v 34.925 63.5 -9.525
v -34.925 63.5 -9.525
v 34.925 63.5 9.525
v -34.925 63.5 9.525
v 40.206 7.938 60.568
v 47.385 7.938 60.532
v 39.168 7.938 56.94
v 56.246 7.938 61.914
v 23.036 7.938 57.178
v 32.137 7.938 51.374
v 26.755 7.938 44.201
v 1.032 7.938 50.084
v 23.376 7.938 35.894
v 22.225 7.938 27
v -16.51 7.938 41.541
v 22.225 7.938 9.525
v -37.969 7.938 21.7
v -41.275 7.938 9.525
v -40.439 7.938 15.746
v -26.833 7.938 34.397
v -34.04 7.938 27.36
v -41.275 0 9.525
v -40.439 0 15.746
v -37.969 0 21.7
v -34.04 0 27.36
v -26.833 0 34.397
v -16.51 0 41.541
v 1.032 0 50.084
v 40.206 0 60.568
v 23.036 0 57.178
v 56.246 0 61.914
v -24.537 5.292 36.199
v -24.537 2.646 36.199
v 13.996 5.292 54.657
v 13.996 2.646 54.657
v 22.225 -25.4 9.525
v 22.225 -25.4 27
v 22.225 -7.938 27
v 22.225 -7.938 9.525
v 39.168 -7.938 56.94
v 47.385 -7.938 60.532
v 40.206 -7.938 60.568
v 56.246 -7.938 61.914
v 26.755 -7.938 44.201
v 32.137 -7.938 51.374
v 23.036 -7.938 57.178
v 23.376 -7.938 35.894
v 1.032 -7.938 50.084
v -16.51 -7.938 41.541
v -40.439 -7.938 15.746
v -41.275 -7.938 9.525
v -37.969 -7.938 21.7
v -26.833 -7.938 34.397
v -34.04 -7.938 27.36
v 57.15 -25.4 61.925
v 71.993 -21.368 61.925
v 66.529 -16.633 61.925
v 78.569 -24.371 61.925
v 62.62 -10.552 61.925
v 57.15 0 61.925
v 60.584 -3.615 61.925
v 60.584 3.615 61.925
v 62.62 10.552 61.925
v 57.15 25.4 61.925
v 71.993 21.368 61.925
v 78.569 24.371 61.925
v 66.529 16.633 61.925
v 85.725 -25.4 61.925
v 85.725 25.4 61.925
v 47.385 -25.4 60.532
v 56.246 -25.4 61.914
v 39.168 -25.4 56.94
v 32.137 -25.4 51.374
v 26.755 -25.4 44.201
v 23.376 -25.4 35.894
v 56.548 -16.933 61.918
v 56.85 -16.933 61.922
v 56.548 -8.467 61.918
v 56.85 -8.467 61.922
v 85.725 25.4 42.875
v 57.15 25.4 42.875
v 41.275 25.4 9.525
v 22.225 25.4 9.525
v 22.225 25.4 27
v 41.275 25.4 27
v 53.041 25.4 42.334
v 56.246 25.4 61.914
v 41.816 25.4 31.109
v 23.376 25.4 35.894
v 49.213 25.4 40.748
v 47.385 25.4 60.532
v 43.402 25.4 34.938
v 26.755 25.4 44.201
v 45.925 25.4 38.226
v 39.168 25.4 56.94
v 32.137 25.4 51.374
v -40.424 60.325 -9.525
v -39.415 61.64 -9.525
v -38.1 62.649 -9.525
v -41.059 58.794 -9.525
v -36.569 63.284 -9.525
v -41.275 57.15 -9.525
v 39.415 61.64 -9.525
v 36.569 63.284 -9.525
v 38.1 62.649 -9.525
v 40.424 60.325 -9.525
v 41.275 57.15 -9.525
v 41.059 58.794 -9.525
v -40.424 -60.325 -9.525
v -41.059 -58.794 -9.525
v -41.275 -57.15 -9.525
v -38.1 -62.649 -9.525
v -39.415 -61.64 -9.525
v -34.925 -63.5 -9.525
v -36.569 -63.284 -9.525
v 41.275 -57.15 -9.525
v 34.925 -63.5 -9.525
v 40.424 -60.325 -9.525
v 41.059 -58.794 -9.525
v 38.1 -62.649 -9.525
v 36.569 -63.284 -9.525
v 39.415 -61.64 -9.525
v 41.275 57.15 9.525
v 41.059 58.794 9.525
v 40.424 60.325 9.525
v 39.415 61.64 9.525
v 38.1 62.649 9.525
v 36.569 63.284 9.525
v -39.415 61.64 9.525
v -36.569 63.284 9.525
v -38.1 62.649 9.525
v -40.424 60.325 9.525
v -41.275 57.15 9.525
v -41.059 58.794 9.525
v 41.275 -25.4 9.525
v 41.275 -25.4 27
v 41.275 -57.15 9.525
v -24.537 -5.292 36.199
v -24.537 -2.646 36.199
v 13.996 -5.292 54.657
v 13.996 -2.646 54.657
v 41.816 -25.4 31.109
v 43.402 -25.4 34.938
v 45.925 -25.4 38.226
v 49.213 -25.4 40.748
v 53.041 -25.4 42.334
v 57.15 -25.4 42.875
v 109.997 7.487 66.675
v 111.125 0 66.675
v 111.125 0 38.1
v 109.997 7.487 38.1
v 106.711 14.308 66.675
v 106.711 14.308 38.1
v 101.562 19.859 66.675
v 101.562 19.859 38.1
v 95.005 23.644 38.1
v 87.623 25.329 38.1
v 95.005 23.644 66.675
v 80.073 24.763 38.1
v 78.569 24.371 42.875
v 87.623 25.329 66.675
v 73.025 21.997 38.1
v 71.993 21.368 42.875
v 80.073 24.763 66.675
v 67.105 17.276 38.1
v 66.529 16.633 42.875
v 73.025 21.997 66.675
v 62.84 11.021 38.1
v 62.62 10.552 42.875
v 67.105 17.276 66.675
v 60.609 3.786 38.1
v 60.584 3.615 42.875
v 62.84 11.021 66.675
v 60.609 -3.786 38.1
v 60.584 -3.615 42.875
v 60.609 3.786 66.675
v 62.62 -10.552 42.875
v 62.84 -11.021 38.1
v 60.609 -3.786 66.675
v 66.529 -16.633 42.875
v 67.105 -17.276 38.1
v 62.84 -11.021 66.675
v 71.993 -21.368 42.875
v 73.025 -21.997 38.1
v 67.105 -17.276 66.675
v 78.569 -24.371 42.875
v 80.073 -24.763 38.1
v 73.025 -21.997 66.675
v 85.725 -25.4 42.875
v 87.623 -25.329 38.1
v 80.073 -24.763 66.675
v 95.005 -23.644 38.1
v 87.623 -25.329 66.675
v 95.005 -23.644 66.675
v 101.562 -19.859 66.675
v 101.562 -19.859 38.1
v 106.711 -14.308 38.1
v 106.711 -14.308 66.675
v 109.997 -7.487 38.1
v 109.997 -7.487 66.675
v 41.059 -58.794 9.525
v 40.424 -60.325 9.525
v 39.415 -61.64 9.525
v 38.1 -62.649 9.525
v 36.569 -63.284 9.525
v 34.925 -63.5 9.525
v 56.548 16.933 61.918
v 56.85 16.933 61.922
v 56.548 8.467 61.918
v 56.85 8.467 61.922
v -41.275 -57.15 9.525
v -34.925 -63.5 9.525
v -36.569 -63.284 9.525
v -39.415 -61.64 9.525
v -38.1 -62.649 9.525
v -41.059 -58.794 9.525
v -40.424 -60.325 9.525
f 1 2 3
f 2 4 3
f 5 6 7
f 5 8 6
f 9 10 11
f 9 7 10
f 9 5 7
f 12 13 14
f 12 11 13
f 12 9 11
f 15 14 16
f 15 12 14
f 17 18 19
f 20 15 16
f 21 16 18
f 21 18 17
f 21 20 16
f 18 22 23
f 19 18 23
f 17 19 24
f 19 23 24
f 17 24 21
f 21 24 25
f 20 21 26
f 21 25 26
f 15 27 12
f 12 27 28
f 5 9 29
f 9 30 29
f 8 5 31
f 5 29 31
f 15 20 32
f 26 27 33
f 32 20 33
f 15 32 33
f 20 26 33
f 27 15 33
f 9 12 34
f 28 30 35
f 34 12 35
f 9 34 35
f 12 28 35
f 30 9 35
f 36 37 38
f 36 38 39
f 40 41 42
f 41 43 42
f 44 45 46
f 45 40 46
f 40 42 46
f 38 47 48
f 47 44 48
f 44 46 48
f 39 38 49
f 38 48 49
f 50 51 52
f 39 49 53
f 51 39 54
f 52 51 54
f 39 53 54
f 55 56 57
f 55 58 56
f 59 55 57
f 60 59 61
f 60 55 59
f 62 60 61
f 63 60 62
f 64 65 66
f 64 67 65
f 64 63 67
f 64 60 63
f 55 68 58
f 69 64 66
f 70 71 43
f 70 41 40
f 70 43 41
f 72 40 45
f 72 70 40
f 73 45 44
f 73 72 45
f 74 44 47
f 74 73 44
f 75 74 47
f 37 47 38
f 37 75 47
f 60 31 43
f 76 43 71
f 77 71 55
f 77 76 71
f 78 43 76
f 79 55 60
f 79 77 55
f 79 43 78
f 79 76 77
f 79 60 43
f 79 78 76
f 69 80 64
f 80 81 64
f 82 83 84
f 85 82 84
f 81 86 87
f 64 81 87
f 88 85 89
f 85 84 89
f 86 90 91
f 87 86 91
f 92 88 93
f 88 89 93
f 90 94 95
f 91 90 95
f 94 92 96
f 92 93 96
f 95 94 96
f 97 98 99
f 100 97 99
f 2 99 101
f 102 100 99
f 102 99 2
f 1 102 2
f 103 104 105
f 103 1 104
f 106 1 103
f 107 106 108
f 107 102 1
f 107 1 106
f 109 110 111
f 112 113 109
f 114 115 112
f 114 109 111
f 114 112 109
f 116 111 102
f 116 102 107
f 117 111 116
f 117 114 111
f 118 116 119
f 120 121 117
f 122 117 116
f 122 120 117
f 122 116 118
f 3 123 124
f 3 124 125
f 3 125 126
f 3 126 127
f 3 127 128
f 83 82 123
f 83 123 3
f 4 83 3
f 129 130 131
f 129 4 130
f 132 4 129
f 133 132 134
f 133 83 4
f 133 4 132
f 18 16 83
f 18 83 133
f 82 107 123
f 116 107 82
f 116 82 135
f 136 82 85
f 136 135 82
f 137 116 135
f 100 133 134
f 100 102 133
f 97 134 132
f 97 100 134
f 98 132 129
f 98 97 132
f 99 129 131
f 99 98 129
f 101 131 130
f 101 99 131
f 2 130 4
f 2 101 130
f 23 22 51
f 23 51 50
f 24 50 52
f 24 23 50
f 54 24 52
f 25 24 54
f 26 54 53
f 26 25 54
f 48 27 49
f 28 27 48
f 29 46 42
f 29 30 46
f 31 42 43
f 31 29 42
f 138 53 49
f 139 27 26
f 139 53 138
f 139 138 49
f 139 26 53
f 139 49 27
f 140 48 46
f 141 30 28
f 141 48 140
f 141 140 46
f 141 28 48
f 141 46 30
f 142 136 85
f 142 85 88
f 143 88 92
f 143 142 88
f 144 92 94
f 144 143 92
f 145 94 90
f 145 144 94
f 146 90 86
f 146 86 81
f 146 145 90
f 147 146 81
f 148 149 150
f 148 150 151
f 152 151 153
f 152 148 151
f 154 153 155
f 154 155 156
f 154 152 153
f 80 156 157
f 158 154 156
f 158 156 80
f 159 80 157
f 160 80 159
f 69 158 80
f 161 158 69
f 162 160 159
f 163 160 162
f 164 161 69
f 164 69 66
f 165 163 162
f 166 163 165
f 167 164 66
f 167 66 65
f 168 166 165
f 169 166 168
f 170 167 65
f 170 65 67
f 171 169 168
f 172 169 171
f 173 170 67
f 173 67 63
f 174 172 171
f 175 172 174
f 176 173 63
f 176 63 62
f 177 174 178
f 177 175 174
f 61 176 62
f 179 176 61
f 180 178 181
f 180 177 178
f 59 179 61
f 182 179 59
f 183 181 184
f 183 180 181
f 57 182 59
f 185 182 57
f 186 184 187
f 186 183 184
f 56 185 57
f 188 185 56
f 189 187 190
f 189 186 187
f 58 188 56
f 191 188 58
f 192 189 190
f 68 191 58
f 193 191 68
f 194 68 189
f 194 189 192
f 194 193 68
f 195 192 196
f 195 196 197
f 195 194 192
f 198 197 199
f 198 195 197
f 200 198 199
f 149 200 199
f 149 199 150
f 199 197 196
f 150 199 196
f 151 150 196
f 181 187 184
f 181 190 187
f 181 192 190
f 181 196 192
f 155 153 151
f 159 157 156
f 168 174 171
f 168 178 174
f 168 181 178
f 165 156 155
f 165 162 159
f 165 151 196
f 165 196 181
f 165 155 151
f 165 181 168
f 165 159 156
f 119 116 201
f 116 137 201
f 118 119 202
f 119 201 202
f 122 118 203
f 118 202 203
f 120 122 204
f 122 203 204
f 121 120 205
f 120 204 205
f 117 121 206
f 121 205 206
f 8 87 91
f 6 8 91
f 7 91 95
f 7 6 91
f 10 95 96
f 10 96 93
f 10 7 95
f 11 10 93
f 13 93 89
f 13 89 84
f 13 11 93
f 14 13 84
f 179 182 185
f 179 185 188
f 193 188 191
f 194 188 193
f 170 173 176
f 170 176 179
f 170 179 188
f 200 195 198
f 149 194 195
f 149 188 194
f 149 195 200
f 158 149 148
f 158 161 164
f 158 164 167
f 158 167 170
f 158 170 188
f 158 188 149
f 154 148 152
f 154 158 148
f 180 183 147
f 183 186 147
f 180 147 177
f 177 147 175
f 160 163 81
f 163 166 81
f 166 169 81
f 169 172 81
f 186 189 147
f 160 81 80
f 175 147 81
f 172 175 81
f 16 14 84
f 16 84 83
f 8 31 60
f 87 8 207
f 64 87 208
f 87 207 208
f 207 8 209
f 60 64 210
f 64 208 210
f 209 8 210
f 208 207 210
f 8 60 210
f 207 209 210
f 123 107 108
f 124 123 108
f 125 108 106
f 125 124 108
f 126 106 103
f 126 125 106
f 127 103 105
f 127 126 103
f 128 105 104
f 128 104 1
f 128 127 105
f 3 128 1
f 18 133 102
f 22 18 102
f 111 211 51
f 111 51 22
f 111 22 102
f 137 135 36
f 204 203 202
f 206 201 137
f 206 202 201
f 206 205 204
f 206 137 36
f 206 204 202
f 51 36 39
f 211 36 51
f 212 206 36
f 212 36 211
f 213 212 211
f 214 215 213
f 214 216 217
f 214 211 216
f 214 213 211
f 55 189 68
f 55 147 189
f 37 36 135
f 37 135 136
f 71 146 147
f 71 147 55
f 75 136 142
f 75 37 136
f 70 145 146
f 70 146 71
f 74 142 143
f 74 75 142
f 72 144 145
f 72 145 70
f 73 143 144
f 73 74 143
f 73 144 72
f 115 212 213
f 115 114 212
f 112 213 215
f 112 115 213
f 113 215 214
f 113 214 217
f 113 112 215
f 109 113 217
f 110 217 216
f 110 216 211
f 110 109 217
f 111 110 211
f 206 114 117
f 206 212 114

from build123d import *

# Parameters (mm, degrees)
F1_DEPTH  = 63.5
F2_DEPTH  = 25.4
F3_DEPTH  = 7.9375
F2_FACE_W = 50.8
F2_FACE_H = 19.05
F4_DEPTH  = 25.4
F6_R      = 6.35


with BuildPart() as f1:
    # F0 (on Front) → F1 (new body, symmetric)
    with BuildSketch(Plane.XZ):
        Polygon((-41.275, -9.525), (41.275, -9.525), (41.275, 9.525), (22.225, 9.525), (-41.275, 9.525), align=None)
    extrude(amount=F1_DEPTH, both=True)

    # F0 (on Front) → F2 (join, symmetric)
    with BuildSketch(Plane.XZ):
        with BuildLine():
            Line((22.225, 9.525), (41.275, 9.525))
            Line((41.275, 9.525), (41.275, 27.0002))
            ThreePointArc((41.275, 27.0002), (45.92468, 38.22552), (57.15, 42.8752))
            Line((57.15, 42.8752), (60.325, 42.8752))
            Line((60.325, 42.8752), (60.325, 61.9252))
            Line((60.325, 61.9252), (57.15, 61.9252))
            add(Edge.make_bspline(
                [(56.246263, 61.913505), (56.548882, 61.918749), (56.850141, 61.92265), (57.15, 61.9252)],
                knots=[110.625514, 110.625514, 110.625514, 110.625514, 111.504536, 111.504536, 111.504536, 111.504536], degree=3))
            ThreePointArc((56.246263, 61.913505), (32.136817, 51.374291), (22.225, 27.0002))
            Line((22.225, 27.0002), (22.225, 9.525))
        make_face()
    extrude(amount=F2_DEPTH, both=True)

    # F0 (on Front) → F3 (join, symmetric)
    with BuildSketch(Plane.XZ):
        with BuildLine():
            add(Edge.make_bspline(
                [(-41.275, 9.525), (-41.458409, 39.311917), (18.161459, 61.253523), (56.246263, 61.913505)],
                knots=[0, 0, 0, 0, 110.625514, 110.625514, 110.625514, 110.625514], degree=3))
            Line((-41.275, 9.525), (22.225, 9.525))
            Line((22.225, 9.525), (22.225, 27.0002))
            ThreePointArc((22.225, 27.0002), (32.136817, 51.374291), (56.246263, 61.913505))
        make_face()
    extrude(amount=F3_DEPTH, both=True)

    # F2_face (on face) → F4 (join, through all)
    with BuildSketch(Plane(origin=(60.325, 0, 52.4002), x_dir=(0, 1, 0), z_dir=(1, 0, 0))):
        Rectangle(F2_FACE_W, F2_FACE_H)
    extrude(amount=F4_DEPTH)

    # F0 (on Front) → F5 (revolve)
    with BuildSketch(Plane.XZ):
        Polygon((85.725, 61.9252), (85.725, 42.8752), (85.725, 38.1), (111.125, 38.1), (111.125, 66.675), (85.725, 66.675), align=None)
    revolve(axis=Axis((85.725, 0, 52.3875), (0, 0, 1)))

    # F6
    f6_edges = [f1.edges().sort_by_distance(p)[0] for p in [
        (41.275, 63.5, 0),
        (-41.275, 63.5, 0),
        (-41.275, -63.5, 0),
        (41.275, -63.5, 0),
    ]]
    fillet(f6_edges, radius=F6_R)


solid = f1.part
